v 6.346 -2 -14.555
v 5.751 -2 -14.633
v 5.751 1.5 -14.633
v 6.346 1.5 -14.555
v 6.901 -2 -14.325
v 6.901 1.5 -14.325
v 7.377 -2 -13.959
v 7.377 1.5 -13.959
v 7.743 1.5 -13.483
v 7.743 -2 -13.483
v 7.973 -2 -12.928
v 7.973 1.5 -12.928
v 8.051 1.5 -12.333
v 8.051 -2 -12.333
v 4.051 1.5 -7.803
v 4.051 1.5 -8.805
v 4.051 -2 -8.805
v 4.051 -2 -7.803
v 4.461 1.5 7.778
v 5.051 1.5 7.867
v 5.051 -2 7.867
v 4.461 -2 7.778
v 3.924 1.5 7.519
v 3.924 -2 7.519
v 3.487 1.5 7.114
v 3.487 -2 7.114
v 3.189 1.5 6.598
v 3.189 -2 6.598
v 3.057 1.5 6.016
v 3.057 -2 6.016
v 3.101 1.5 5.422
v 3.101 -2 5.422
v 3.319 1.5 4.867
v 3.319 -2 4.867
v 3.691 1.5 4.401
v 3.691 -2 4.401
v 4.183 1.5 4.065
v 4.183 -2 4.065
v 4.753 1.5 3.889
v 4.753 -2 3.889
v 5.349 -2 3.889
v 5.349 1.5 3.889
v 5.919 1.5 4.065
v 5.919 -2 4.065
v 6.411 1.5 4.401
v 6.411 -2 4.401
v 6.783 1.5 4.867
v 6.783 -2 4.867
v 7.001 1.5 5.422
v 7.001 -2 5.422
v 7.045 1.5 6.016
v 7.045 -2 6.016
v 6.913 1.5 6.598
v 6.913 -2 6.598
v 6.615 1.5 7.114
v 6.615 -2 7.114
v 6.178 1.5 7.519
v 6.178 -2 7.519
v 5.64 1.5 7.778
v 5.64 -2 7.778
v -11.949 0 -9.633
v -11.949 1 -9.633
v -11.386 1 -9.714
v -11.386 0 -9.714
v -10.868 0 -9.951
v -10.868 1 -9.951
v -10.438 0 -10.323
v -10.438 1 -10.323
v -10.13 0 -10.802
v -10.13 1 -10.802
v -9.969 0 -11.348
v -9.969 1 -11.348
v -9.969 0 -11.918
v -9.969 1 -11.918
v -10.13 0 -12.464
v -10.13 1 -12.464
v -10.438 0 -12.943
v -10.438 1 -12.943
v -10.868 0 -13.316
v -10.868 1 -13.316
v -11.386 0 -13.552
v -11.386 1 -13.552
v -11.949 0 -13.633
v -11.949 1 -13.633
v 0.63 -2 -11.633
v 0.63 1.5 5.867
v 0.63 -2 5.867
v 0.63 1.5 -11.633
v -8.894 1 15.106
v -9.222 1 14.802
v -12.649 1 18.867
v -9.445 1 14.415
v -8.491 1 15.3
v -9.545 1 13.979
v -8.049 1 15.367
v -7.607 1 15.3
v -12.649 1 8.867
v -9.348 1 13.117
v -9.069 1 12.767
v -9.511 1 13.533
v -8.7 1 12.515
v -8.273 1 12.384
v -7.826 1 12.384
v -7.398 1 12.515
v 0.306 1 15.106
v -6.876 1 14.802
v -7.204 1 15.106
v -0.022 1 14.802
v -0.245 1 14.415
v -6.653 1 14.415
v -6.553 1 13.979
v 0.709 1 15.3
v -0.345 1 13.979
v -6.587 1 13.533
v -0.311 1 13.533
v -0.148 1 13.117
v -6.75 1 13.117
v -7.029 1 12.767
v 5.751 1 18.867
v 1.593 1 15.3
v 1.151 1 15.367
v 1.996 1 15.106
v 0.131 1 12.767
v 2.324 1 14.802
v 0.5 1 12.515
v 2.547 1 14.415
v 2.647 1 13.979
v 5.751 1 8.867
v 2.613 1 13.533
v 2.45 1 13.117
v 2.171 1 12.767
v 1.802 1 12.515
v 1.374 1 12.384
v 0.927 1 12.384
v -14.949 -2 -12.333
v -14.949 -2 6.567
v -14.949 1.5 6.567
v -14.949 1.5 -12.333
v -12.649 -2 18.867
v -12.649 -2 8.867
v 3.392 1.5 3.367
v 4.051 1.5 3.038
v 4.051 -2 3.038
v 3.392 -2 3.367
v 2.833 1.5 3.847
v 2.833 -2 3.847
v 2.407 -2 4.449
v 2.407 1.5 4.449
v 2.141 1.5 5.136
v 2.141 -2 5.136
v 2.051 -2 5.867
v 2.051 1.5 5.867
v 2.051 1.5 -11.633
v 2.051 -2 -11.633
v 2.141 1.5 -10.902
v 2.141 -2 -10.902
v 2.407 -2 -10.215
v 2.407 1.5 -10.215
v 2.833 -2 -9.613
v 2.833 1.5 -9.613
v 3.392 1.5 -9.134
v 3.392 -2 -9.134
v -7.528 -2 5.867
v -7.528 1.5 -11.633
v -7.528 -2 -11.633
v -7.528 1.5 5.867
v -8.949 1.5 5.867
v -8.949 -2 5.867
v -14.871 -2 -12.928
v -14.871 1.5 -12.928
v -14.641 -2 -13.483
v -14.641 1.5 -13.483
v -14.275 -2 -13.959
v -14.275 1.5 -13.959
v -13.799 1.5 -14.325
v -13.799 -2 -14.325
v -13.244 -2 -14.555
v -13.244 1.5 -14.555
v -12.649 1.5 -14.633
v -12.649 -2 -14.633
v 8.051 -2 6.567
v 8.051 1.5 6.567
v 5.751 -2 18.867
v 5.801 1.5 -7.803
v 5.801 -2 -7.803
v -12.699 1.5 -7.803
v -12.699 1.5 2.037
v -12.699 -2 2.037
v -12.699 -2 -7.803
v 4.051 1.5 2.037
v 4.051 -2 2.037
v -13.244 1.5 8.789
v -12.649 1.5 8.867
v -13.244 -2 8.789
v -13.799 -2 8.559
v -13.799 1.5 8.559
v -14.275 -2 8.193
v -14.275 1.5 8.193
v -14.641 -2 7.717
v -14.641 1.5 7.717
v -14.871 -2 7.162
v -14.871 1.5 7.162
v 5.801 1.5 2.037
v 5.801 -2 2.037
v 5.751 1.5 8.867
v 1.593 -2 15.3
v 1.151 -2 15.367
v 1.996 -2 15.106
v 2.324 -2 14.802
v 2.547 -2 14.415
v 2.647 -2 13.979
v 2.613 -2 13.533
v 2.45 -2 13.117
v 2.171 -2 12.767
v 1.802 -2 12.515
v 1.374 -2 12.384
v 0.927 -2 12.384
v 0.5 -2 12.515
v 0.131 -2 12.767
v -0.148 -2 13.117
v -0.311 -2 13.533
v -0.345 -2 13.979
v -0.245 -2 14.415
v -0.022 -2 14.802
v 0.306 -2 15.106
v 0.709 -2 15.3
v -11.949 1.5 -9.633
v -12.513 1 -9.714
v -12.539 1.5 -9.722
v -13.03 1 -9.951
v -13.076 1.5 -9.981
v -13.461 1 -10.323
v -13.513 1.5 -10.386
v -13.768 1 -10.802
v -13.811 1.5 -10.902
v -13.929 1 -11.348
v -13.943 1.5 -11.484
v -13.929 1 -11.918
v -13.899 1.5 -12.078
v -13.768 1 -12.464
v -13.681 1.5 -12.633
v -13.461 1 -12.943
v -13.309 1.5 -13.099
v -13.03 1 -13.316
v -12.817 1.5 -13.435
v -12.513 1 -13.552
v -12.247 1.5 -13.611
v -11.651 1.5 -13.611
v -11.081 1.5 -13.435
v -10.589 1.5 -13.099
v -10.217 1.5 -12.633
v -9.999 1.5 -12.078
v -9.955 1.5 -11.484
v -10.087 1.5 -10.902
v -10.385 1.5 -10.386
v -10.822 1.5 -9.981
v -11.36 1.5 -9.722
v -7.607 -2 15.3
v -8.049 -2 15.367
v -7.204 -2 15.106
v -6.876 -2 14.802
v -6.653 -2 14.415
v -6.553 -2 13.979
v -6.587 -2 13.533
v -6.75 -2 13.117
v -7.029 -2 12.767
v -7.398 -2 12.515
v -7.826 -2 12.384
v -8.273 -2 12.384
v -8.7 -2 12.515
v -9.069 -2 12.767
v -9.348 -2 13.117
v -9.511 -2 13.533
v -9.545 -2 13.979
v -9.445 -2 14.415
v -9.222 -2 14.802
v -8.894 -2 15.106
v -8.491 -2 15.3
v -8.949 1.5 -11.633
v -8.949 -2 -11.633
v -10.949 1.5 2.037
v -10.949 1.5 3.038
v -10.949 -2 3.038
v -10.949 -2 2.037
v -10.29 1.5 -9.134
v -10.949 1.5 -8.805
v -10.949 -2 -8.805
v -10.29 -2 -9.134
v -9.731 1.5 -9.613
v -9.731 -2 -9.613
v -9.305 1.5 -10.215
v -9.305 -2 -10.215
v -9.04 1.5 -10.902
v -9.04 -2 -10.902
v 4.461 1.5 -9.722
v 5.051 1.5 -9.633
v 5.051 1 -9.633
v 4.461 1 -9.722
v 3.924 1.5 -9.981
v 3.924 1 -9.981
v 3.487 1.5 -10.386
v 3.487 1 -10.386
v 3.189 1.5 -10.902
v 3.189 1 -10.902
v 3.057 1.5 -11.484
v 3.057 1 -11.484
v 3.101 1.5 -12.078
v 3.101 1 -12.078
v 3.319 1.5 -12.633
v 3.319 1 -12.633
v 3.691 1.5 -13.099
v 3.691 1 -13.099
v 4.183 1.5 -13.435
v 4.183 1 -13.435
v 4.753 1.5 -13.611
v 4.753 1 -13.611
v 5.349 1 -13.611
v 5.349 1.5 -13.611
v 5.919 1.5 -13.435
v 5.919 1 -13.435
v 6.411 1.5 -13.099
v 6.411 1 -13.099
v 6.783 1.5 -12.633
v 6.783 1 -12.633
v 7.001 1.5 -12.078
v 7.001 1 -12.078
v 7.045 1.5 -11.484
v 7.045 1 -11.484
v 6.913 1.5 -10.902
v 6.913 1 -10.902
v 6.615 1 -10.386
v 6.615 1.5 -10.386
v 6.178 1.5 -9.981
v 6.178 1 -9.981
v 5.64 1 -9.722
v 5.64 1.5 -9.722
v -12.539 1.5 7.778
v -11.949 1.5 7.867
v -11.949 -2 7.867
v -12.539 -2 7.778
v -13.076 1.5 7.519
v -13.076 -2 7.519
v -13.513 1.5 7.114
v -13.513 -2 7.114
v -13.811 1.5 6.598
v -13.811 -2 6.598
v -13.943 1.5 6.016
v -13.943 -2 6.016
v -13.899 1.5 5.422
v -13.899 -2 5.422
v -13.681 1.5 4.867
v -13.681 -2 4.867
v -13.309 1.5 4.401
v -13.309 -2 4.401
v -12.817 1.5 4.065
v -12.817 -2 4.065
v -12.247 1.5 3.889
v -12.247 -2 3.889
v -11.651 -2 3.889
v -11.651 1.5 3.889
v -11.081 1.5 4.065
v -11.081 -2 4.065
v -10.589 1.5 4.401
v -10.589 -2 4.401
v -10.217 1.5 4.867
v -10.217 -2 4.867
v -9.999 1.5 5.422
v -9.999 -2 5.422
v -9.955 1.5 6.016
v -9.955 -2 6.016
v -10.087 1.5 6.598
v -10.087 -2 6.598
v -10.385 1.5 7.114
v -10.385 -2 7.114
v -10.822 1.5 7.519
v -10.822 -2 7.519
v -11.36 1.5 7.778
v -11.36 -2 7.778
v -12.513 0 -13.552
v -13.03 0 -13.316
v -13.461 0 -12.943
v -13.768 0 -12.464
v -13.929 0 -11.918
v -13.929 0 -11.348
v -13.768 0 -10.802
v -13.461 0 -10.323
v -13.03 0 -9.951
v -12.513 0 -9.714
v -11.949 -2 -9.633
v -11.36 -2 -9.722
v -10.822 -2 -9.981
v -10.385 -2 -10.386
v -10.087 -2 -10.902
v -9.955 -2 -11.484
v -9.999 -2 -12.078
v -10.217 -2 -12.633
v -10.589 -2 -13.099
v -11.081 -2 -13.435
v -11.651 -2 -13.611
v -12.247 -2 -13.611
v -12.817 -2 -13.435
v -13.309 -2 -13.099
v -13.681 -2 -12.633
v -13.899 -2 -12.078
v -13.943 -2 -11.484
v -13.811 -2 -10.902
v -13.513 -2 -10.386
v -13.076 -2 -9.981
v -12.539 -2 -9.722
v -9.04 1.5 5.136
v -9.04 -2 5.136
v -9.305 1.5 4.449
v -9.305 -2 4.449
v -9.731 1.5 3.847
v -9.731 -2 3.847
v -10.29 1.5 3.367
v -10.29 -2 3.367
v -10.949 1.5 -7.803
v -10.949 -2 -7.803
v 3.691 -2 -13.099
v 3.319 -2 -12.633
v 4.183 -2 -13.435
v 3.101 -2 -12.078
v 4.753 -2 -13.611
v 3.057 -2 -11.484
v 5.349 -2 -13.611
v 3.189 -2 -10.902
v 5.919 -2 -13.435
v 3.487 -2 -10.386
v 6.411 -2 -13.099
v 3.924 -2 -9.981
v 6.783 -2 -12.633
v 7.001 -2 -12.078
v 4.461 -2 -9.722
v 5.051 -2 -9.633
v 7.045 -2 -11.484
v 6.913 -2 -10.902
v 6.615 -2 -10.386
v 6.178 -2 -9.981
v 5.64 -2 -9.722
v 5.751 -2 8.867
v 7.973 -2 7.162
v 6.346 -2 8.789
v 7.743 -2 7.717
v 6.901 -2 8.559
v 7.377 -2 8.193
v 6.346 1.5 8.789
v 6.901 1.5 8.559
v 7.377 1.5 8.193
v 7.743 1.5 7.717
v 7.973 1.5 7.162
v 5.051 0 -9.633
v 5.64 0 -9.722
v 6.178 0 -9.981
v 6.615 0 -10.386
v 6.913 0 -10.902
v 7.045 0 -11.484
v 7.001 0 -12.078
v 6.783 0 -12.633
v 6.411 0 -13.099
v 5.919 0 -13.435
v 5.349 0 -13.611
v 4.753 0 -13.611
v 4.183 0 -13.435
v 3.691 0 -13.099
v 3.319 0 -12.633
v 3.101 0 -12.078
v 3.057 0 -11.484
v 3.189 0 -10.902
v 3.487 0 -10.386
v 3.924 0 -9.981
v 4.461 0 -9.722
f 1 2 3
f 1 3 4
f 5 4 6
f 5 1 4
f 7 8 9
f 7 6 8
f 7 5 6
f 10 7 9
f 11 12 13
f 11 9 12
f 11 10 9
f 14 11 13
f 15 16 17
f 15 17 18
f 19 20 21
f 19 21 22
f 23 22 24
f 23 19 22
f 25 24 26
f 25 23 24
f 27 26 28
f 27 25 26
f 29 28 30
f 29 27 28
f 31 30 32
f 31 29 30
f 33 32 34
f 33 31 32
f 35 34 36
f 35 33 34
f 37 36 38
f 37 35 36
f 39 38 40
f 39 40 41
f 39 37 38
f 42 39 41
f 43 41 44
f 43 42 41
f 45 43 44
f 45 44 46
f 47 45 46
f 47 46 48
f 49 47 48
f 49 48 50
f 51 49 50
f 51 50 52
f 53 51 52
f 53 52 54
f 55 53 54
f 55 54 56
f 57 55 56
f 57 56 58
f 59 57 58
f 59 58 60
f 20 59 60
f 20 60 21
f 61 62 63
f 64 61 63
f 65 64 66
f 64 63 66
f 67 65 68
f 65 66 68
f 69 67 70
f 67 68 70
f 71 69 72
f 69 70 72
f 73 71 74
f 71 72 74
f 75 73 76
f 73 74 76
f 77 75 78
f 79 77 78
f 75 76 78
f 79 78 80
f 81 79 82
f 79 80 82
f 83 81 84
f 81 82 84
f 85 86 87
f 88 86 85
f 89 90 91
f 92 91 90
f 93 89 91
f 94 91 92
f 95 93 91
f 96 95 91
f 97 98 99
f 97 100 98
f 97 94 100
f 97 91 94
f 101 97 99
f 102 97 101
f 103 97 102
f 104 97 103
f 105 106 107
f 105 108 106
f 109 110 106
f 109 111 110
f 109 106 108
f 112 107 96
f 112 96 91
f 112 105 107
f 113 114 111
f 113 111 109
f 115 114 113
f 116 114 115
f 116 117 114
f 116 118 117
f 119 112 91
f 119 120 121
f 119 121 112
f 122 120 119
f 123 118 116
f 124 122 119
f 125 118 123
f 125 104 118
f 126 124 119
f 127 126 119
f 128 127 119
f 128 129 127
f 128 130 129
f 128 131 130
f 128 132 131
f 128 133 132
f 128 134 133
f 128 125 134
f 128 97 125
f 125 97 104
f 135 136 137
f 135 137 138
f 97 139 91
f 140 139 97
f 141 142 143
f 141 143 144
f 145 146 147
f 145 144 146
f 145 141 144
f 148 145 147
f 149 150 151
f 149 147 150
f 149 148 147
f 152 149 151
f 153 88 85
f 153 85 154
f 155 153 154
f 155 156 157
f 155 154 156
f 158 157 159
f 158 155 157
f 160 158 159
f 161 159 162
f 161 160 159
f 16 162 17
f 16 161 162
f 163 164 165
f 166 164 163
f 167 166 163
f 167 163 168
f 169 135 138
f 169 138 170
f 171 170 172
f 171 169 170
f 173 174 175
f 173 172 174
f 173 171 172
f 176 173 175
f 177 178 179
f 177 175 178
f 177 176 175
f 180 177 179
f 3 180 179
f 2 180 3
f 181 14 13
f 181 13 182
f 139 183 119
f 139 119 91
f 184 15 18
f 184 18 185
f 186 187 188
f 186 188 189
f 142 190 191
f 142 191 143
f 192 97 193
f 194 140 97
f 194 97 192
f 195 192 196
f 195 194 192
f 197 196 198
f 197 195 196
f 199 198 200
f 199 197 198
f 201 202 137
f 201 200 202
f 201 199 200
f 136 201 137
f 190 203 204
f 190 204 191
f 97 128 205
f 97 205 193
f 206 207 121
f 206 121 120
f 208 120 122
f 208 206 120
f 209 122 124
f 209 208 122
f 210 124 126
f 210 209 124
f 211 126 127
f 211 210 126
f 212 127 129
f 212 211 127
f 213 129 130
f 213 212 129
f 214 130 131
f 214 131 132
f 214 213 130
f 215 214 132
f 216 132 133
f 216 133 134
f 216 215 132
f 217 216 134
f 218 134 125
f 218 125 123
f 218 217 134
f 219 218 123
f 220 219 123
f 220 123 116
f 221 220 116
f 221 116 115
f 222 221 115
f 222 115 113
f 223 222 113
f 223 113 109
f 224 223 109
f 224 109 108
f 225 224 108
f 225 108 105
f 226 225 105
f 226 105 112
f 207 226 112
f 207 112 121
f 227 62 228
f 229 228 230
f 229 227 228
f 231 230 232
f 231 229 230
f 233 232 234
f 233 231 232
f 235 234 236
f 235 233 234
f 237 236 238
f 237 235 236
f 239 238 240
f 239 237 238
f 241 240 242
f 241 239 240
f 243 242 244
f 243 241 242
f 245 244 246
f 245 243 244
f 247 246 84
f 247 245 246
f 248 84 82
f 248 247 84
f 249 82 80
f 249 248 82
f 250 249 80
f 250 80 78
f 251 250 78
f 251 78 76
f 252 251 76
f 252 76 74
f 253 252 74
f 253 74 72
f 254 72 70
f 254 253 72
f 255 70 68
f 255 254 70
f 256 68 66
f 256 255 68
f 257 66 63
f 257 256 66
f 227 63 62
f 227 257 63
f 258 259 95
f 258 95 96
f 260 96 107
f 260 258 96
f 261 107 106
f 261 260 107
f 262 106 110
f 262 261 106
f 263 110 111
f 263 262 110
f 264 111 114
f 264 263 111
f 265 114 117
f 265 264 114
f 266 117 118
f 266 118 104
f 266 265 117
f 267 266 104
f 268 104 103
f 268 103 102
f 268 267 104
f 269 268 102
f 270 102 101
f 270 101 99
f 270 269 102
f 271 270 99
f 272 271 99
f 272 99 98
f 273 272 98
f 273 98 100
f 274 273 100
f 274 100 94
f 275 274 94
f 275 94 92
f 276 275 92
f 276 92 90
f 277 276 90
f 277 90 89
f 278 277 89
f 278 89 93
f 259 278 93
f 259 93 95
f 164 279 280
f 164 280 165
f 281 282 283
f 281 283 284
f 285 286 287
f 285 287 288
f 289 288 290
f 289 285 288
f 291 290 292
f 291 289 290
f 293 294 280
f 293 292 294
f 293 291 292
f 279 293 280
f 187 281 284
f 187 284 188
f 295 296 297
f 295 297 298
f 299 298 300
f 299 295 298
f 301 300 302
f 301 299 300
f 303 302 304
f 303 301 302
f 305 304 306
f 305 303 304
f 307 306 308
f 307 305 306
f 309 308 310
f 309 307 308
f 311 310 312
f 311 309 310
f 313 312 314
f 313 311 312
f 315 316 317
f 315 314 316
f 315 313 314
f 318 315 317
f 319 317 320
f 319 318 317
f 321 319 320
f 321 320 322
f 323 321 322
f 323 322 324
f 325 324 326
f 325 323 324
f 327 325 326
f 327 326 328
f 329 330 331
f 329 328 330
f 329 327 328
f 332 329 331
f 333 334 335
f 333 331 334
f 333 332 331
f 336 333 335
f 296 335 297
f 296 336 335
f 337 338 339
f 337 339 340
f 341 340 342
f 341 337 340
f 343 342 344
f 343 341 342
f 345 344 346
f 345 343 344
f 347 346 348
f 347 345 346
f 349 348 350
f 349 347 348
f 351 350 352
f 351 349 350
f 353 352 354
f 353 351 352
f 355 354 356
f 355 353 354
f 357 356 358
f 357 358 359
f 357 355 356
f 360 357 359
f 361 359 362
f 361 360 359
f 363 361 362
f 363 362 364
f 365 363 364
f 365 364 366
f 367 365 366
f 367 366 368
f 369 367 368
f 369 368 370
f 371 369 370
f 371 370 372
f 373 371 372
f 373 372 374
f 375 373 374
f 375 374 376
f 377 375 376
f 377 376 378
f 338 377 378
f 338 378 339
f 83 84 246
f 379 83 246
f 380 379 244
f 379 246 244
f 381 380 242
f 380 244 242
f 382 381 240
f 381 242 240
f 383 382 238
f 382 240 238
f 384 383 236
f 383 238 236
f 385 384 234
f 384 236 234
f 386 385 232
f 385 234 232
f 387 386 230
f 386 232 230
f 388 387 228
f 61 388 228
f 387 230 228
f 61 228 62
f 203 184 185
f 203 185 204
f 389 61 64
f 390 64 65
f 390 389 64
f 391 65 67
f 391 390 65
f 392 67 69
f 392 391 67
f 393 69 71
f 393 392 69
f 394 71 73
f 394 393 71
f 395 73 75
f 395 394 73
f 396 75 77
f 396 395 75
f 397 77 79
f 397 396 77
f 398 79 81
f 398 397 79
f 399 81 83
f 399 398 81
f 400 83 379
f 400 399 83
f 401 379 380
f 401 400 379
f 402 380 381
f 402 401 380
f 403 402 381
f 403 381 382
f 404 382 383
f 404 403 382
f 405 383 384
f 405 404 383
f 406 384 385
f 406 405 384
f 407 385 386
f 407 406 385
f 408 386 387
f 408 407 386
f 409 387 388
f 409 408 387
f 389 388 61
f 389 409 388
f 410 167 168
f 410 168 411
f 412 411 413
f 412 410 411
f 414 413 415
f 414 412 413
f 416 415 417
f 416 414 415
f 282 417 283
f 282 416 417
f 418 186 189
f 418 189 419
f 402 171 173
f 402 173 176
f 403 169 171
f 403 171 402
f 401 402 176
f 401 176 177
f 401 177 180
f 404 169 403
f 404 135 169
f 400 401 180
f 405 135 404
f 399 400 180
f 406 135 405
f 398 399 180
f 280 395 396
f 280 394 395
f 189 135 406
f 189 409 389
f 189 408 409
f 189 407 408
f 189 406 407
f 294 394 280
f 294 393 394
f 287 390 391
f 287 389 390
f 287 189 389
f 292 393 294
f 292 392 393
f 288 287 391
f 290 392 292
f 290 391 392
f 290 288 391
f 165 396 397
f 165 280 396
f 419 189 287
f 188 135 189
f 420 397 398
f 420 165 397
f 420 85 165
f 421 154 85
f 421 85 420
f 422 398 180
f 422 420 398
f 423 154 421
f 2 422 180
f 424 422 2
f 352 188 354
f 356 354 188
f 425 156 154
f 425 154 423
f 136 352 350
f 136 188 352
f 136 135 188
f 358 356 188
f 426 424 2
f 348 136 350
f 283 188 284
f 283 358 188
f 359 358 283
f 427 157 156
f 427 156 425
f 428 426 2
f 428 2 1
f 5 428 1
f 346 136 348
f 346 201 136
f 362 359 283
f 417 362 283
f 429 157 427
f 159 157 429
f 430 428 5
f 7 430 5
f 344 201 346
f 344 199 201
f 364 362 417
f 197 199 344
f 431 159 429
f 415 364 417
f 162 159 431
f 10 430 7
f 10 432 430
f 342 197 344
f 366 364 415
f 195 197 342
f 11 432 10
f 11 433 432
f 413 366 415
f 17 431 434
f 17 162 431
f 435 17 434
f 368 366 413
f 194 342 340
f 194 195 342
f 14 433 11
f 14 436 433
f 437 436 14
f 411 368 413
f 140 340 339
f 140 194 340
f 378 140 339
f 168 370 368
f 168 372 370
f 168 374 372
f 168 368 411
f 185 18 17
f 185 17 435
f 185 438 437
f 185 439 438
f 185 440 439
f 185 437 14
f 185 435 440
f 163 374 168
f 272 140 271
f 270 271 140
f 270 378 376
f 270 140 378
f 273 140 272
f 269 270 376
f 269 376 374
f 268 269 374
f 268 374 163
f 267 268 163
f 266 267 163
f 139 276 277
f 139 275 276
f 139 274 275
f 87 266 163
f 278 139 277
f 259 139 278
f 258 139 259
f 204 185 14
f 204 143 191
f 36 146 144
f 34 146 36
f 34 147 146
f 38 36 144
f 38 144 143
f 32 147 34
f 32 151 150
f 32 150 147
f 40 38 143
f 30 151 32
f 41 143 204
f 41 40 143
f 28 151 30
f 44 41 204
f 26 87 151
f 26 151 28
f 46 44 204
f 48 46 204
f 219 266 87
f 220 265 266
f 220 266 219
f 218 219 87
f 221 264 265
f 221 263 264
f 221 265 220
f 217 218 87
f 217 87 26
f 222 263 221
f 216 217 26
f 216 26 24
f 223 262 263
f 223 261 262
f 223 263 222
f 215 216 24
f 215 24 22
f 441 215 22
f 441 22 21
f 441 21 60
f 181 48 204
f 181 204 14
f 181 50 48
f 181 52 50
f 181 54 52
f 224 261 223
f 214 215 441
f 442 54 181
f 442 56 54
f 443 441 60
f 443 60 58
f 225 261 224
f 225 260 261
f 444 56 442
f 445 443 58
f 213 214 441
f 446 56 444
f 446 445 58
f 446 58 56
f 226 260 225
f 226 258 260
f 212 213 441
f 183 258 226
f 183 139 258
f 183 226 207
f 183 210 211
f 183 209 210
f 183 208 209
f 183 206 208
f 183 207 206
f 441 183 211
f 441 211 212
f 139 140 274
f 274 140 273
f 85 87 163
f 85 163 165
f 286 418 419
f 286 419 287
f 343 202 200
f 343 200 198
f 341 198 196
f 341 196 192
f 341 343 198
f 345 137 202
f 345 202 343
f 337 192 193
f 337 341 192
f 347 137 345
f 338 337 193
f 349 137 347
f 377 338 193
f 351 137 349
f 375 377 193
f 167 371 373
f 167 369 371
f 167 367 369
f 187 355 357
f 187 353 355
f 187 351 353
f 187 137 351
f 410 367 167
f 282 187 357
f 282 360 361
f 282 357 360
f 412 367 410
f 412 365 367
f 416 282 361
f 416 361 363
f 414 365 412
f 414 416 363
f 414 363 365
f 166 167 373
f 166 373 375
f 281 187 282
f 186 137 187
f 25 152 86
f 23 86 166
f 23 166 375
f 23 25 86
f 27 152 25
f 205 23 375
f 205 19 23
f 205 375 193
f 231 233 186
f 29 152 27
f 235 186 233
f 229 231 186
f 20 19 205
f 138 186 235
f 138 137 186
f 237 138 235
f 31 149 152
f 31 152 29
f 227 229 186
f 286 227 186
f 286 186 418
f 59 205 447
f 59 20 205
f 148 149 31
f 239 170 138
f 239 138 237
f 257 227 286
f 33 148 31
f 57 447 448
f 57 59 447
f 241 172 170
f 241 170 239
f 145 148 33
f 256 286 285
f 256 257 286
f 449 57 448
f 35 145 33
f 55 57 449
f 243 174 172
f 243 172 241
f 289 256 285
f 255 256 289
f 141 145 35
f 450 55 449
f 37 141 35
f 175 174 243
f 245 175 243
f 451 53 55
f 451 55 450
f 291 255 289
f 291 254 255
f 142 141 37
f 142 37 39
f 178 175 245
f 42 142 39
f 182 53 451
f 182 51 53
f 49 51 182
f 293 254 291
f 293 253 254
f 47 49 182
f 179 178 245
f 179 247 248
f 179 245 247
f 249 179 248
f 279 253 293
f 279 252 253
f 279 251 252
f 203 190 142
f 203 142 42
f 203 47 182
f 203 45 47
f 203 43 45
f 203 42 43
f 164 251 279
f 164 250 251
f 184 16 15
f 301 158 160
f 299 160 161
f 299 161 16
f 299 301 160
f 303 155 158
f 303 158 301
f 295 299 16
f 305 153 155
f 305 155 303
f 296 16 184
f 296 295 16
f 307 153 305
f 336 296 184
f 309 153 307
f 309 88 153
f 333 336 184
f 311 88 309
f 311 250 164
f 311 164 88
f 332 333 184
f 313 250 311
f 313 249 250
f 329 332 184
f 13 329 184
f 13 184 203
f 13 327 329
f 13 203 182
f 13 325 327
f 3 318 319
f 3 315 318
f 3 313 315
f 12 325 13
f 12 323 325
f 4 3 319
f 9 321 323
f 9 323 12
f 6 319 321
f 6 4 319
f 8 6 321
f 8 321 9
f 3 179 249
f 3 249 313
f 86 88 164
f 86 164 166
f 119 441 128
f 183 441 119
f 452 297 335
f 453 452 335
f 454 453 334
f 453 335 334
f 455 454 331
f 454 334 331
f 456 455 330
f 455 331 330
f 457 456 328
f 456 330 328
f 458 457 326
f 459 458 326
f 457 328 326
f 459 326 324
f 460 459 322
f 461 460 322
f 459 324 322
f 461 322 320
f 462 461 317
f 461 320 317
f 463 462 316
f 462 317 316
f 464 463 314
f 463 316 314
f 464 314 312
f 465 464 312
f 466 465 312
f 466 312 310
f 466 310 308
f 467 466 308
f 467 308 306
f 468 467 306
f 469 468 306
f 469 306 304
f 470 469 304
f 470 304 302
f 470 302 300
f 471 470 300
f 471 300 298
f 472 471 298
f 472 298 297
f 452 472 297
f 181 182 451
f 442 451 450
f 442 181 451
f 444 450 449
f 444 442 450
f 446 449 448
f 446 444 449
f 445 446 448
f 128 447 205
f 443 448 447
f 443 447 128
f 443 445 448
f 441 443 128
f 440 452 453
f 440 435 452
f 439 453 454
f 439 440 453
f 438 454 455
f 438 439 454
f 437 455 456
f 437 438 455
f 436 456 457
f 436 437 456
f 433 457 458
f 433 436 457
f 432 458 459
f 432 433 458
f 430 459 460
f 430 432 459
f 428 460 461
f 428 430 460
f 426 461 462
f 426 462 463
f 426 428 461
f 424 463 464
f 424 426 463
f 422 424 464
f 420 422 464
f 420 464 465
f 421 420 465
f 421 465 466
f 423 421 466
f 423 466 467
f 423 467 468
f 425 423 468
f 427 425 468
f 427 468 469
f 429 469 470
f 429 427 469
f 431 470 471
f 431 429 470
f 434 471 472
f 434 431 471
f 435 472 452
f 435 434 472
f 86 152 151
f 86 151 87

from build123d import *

# Parameters (mm, degrees)
BOSS_EXTRUDE1_DEPTH      = 2
CUT_EXTRUDE2_DEPTH       = 1
SKETCH5_R                = 2
CUT_EXTRUDE3_DEPTH       = 21.942838525
CUT_EXTRUDE4_DEPTH       = 21.942838525
SKETCH7_W                = 18.4
SKETCH7_H                = 1
BOSS_EXTRUDE2_DEPTH      = 10
SKETCH8_R                = 1.5
CUT_EXTRUDE5_DEPTH       = 25.092211634
CUT_EXTRUDE6_DEPTH       = 1
SKETCH11_W               = 1.421057218
SKETCH11_H               = 17.5
SKETCH11_W_2             = 1.75
SKETCH11_H_2             = 9.84
CUT_EXTRUDE7_DEPTH       = 25.092211634
BOSS_EXTRUDE3_START      = 2
BOSS_EXTRUDE3_DEPTH      = 2
CUT_EXTRUDE8_DEPTH       = 25.154392176
CUT_EXTRUDE8_DEPTH_BACK  = 25.154392176
CUT_EXTRUDE9_DEPTH       = 25.154392176
CUT_EXTRUDE9_DEPTH_BACK  = 25.154392176
CUT_EXTRUDE10_DEPTH      = 25.154392176
CUT_EXTRUDE10_DEPTH_BACK = 25.154392176
SKETCH15_R               = 1.5
CUT_EXTRUDE11_DEPTH      = 25.154392176
CUT_EXTRUDE11_DEPTH_BACK = 25.154392176
SKETCH16_R               = 1.5
CUT_EXTRUDE12_DEPTH      = 25.154392176
CUT_EXTRUDE12_DEPTH_BACK = 25.154392176
SKETCH17_R               = 2
BOSS_EXTRUDE4_START      = 1
BOSS_EXTRUDE4_DEPTH      = 1
CUT_EXTRUDE13_DEPTH      = 25.257672217
CUT_EXTRUDE13_DEPTH_BACK = 25.257672217
SKETCH19_R               = 2
CUT_EXTRUDE14_START      = -0.5
CUT_EXTRUDE14_DEPTH      = 0.5


with BuildPart() as part:
    # Sketch1 → Boss-Extrude1 (new body)
    with BuildSketch(Plane(origin=(0, 0, 0), x_dir=(1, 0, 0), z_dir=(0, 1, 0))):
        with BuildLine():
            Line((-12.649074074, 14.633101852), (5.750925926, 14.633101852))
            ThreePointArc((5.750925926, 14.633101852), (7.377271523, 13.959447449), (8.050925926, 12.333101852))
            Line((8.050925926, 12.333101852), (8.050925926, -6.566898148))
            ThreePointArc((8.050925926, -6.566898148), (7.377271523, -8.193243745), (5.750925926, -8.866898148))
            Line((5.750925926, -8.866898148), (-12.649074074, -8.866898148))
            ThreePointArc((-12.649074074, -8.866898148), (-14.275419671, -8.193243745), (-14.949074074, -6.566898148))
            Line((-14.949074074, -6.566898148), (-14.949074074, 12.333101852))
            ThreePointArc((-14.949074074, 12.333101852), (-14.275419671, 13.959447449), (-12.649074074, 14.633101852))
        make_face()
    extrude(amount=BOSS_EXTRUDE1_DEPTH)

    # Sketch2 → Cut-Extrude2 (cut)
    with BuildSketch(Plane(origin=(0, 2, 0), x_dir=(1, 0, 0), z_dir=(0, 1, 0))):
        with BuildLine():
            Line((5.750925926, 13.633101852), (-12.649074074, 13.633101852))
            ThreePointArc((-12.649074074, 13.633101852), (-13.56831289, 13.252340667), (-13.949074074, 12.333101852))
            Line((-13.949074074, 12.333101852), (-13.949074074, -6.566898148))
            ThreePointArc((-13.949074074, -6.566898148), (-13.56831289, -7.486136964), (-12.649074074, -7.866898148))
            Line((-12.649074074, -7.866898148), (5.750925926, -7.866898148))
            ThreePointArc((5.750925926, -7.866898148), (6.670164741, -7.486136964), (7.050925926, -6.566898148))
            Line((7.050925926, -6.566898148), (7.050925926, 12.333101852))
            ThreePointArc((7.050925926, 12.333101852), (6.670164741, 13.252340667), (5.750925926, 13.633101852))
        make_face()
    extrude(amount=-CUT_EXTRUDE2_DEPTH, mode=Mode.SUBTRACT)

    # Sketch5 → Cut-Extrude3 (cut, through all)
    with BuildSketch(Plane(origin=(0, 1, 0), x_dir=(1, 0, 0), z_dir=(0, 1, 0))):
        with Locations(Location((5.050925926, 11.633101852, 0), (0, 0, 270))):
            Circle(SKETCH5_R)
        with Locations(Location((5.050925926, -5.866898148, 0), (0, 0, 270))):
            Circle(SKETCH5_R)
        with Locations(Location((-11.949074074, -5.866898148, 0), (0, 0, 270))):
            Circle(SKETCH5_R)
        with Locations(Location((-11.949074074, 11.633101852, 0), (0, 0, 90))):
            Circle(SKETCH5_R)
    extrude(amount=-CUT_EXTRUDE3_DEPTH, mode=Mode.SUBTRACT)

    # Sketch6 → Cut-Extrude4 (cut, through all)
    with BuildSketch(Plane(origin=(0, 1, 0), x_dir=(1, 0, 0), z_dir=(0, 1, 0))):
        with BuildLine():
            Line((4.050925926, -3.038471023), (4.050925926, 8.804674727))
            ThreePointArc((4.050925926, 8.804674727), (2.601436183, 9.901051044), (2.050925926, 11.633101852))
            Line((2.050925926, 11.633101852), (2.050925926, -5.866898148))
            ThreePointArc((2.050925926, -5.866898148), (2.601436183, -4.134847341), (4.050925926, -3.038471023))
        make_face()
        with BuildLine():
            Line((-10.949074074, 8.804674727), (-10.949074074, -3.038471023))
            ThreePointArc((-10.949074074, -3.038471023), (-9.499584331, -4.134847341), (-8.949074074, -5.866898148))
            Line((-8.949074074, -5.866898148), (-8.949074074, 11.633101852))
            ThreePointArc((-8.949074074, 11.633101852), (-9.499584331, 9.901051044), (-10.949074074, 8.804674727))
        make_face()
    extrude(amount=-CUT_EXTRUDE4_DEPTH, mode=Mode.SUBTRACT)

    # Sketch7 → Boss-Extrude2 (add)
    with BuildSketch(Plane.XY.offset(8.866898148)):
        with Locations((-3.449074074, 0.5)):
            Rectangle(SKETCH7_W, SKETCH7_H)
    extrude(amount=BOSS_EXTRUDE2_DEPTH)

    # Sketch8 → Cut-Extrude5 (cut, through all)
    with BuildSketch(Plane(origin=(0, 1, 0), x_dir=(1, 0, 0), z_dir=(0, 1, 0))):
        with Locations(Location((1.150925926, -13.866898148, 0), (0, 0, 270))):
            Circle(SKETCH8_R)
        with Locations(Location((-8.049074074, -13.866898148, 0), (0, 0, 270))):
            Circle(SKETCH8_R)
    extrude(amount=-CUT_EXTRUDE5_DEPTH, mode=Mode.SUBTRACT)

    # Sketch9 → Cut-Extrude6 (cut)
    with BuildSketch(Plane(origin=(0, 2, 0), x_dir=(1, 0, 0), z_dir=(0, 1, 0))):
        with BuildLine():
            Line((5.750925926, 13.833101852), (-12.649074074, 13.833101852))
            ThreePointArc((-12.649074074, 13.833101852), (-13.709734246, 13.393762024), (-14.149074074, 12.333101852))
            Line((-14.149074074, 12.333101852), (-14.149074074, -6.566898148))
            ThreePointArc((-14.149074074, -6.566898148), (-13.709734246, -7.62755832), (-12.649074074, -8.066898148))
            Line((-12.649074074, -8.066898148), (5.750925926, -8.066898148))
            ThreePointArc((5.750925926, -8.066898148), (6.811586098, -7.62755832), (7.250925926, -6.566898148))
            Line((7.250925926, -6.566898148), (7.250925926, 12.333101852))
            ThreePointArc((7.250925926, 12.333101852), (6.811586098, 13.393762024), (5.750925926, 13.833101852))
        make_face()
    extrude(amount=-CUT_EXTRUDE6_DEPTH, mode=Mode.SUBTRACT)

    # Sketch11 → Cut-Extrude7 (cut, through all)
    with BuildSketch(Plane(origin=(0, 1, 0), x_dir=(1, 0, 0), z_dir=(0, 1, 0))):
        with Locations((-8.238545465, 2.883101852)):
            Rectangle(SKETCH11_W, SKETCH11_H)
        with Locations((1.340397317, 2.883101852)):
            Rectangle(SKETCH11_W, SKETCH11_H)
        with Locations((-11.824074074, 2.883101852)):
            Rectangle(SKETCH11_W_2, SKETCH11_H_2)
        with Locations((4.925925926, 2.883101852)):
            Rectangle(SKETCH11_W_2, SKETCH11_H_2)
    extrude(amount=-CUT_EXTRUDE7_DEPTH, mode=Mode.SUBTRACT)

    # Sketch12 → Boss-Extrude3 (add)
    with BuildSketch(Plane.XZ.offset(BOSS_EXTRUDE3_START)):
        with BuildLine():
            Line((8.050925926, -12.333101852), (8.050925926, 6.566898148))
            ThreePointArc((8.050925926, 6.566898148), (7.377271523, 8.193243745), (5.750925926, 8.866898148))
            Line((5.750925926, 8.866898148), (5.750925926, 18.866898148))
            Line((5.750925926, 18.866898148), (-12.649074074, 18.866898148))
            Line((-12.649074074, 18.866898148), (-12.649074074, 8.866898148))
            ThreePointArc((-12.649074074, 8.866898148), (-14.275419671, 8.193243745), (-14.949074074, 6.566898148))
            Line((-14.949074074, 6.566898148), (-14.949074074, -12.333101852))
            ThreePointArc((-14.949074074, -12.333101852), (-14.275419671, -13.959447449), (-12.649074074, -14.633101852))
            Line((-12.649074074, -14.633101852), (5.750925926, -14.633101852))
            ThreePointArc((5.750925926, -14.633101852), (7.377271523, -13.959447449), (8.050925926, -12.333101852))
        make_face()
    extrude(amount=-BOSS_EXTRUDE3_DEPTH)

    # Sketch13 → Cut-Extrude8 (cut, two sides: drawn at the far end of the back side and taken through both)
    with BuildSketch(Plane(origin=(0, 0, 0), x_dir=(1, 0, 0), z_dir=(0, 1, 0)).offset(-CUT_EXTRUDE8_DEPTH_BACK)):
        with BuildLine():
            Line((-12.699074074, 7.803101852), (-12.699074074, -2.036898148))
            Line((-12.699074074, -2.036898148), (-10.949074074, -2.036898148))
            Line((-10.949074074, -2.036898148), (-10.949074074, -3.038471023))
            ThreePointArc((-10.949074074, -3.038471023), (-9.499584331, -4.134847341), (-8.949074074, -5.866898148))
            Line((-8.949074074, -5.866898148), (-7.528016856, -5.866898148))
            Line((-7.528016856, -5.866898148), (-7.528016856, 11.633101852))
            Line((-7.528016856, 11.633101852), (-8.949074074, 11.633101852))
            ThreePointArc((-8.949074074, 11.633101852), (-9.499584331, 9.901051044), (-10.949074074, 8.804674727))
            Line((-10.949074074, 8.804674727), (-10.949074074, 7.803101852))
            Line((-10.949074074, 7.803101852), (-12.699074074, 7.803101852))
        make_face()
    extrude(amount=CUT_EXTRUDE8_DEPTH + CUT_EXTRUDE8_DEPTH_BACK, mode=Mode.SUBTRACT)

    # Sketch14 → Cut-Extrude9 (cut, two sides: drawn at the far end of the back side and taken through both)
    with BuildSketch(Plane(origin=(0, 0, 0), x_dir=(1, 0, 0), z_dir=(0, 1, 0)).offset(-CUT_EXTRUDE9_DEPTH_BACK)):
        with BuildLine():
            Line((0.629868708, -5.866898148), (2.050925926, -5.866898148))
            ThreePointArc((2.050925926, -5.866898148), (2.601436183, -4.134847341), (4.050925926, -3.038471023))
            Line((4.050925926, -3.038471023), (4.050925926, -2.036898148))
            Line((4.050925926, -2.036898148), (5.800925926, -2.036898148))
            Line((5.800925926, -2.036898148), (5.800925926, 7.803101852))
            Line((5.800925926, 7.803101852), (4.050925926, 7.803101852))
            Line((4.050925926, 7.803101852), (4.050925926, 8.804674727))
            ThreePointArc((4.050925926, 8.804674727), (2.601436183, 9.901051044), (2.050925926, 11.633101852))
            Line((2.050925926, 11.633101852), (0.629868708, 11.633101852))
            Line((0.629868708, 11.633101852), (0.629868708, -5.866898148))
        make_face()
    extrude(amount=CUT_EXTRUDE9_DEPTH + CUT_EXTRUDE9_DEPTH_BACK, mode=Mode.SUBTRACT)

    # Sketch15 → Cut-Extrude10 (cut, two sides: drawn at the far end of the back side and taken through both)
    with BuildSketch(Plane(origin=(0, 0, 0), x_dir=(1, 0, 0), z_dir=(0, 1, 0)).offset(-CUT_EXTRUDE10_DEPTH_BACK)):
        with Locations(Location((-8.049074074, -13.866898148, 0), (0, 0, 270))):
            Circle(SKETCH15_R)
    extrude(amount=CUT_EXTRUDE10_DEPTH + CUT_EXTRUDE10_DEPTH_BACK, mode=Mode.SUBTRACT)

    # Sketch16 → Cut-Extrude11 (cut, two sides: drawn at the far end of the back side and taken through both)
    with BuildSketch(Plane(origin=(0, 0, 0), x_dir=(1, 0, 0), z_dir=(0, 1, 0)).offset(-CUT_EXTRUDE11_DEPTH_BACK)):
        with Locations(Location((1.150925926, -13.866898148, 0), (0, 0, 270))):
            Circle(SKETCH16_R)
    extrude(amount=CUT_EXTRUDE11_DEPTH + CUT_EXTRUDE11_DEPTH_BACK, mode=Mode.SUBTRACT)

    # Sketch17 → Cut-Extrude12 (cut, two sides: drawn at the far end of the back side and taken through both)
    with BuildSketch(Plane(origin=(0, 0, 0), x_dir=(1, 0, 0), z_dir=(0, 1, 0)).offset(-CUT_EXTRUDE12_DEPTH_BACK)):
        with Locations(Location((-11.949074074, -5.866898148, 0), (0, 0, 270))):
            Circle(SKETCH17_R)
        with Locations(Location((5.050925926, -5.866898148, 0), (0, 0, 270))):
            Circle(SKETCH17_R)
        with Locations(Location((-11.949074074, 11.633101852, 0), (0, 0, 270))):
            Circle(SKETCH17_R)
        with Locations(Location((5.050925926, 11.633101852, 0), (0, 0, 270))):
            Circle(SKETCH17_R)
    extrude(amount=CUT_EXTRUDE12_DEPTH + CUT_EXTRUDE12_DEPTH_BACK, mode=Mode.SUBTRACT)

    # Sketch18 → Boss-Extrude4 (add)
    with BuildSketch(Plane(origin=(0, 1, 0), x_dir=(1, 0, 0), z_dir=(0, 1, 0)).offset(BOSS_EXTRUDE4_START)):
        with BuildLine():
            Line((5.750925926, 13.833101852), (-12.649074074, 13.833101852))
            ThreePointArc((-12.649074074, 13.833101852), (-13.709734246, 13.393762024), (-14.149074074, 12.333101852))
            Line((-14.149074074, 12.333101852), (-14.149074074, -6.566898148))
            ThreePointArc((-14.149074074, -6.566898148), (-13.709734246, -7.62755832), (-12.649074074, -8.066898148))
            Line((-12.649074074, -8.066898148), (5.750925926, -8.066898148))
            ThreePointArc((5.750925926, -8.066898148), (6.811586098, -7.62755832), (7.250925926, -6.566898148))
            Line((7.250925926, -6.566898148), (7.250925926, 12.333101852))
            ThreePointArc((7.250925926, 12.333101852), (6.811586098, 13.393762024), (5.750925926, 13.833101852))
        make_face()
    extrude(amount=-BOSS_EXTRUDE4_DEPTH)

    # Sketch19 → Cut-Extrude13 (cut, two sides: drawn at the far end of the back side and taken through both)
    with BuildSketch(Plane.XZ.offset(-1).offset(-CUT_EXTRUDE13_DEPTH_BACK)):
        with Locations(Location((5.050925926, -11.633101852, 0), (0, 0, 90))):
            Circle(SKETCH19_R)
        with Locations(Location((-11.949074074, -11.633101852, 0), (0, 0, 90))):
            Circle(SKETCH19_R)
        with Locations(Location((-11.949074074, 5.866898148, 0), (0, 0, 90))):
            Circle(SKETCH19_R)
        with Locations(Location((5.050925926, 5.866898148, 0), (0, 0, 90))):
            Circle(SKETCH19_R)
        with BuildLine():
            Line((-10.949074074, 3.038471023), (-10.949074074, 2.036898148))
            Line((-10.949074074, 2.036898148), (-12.699074074, 2.036898148))
            Line((-12.699074074, 2.036898148), (-12.699074074, -7.803101852))
            Line((-12.699074074, -7.803101852), (-10.949074074, -7.803101852))
            Line((-10.949074074, -7.803101852), (-10.949074074, -8.804674727))
            ThreePointArc((-10.949074074, -8.804674727), (-9.499584331, -9.901051044), (-8.949074074, -11.633101852))
            Line((-8.949074074, -11.633101852), (-7.528016856, -11.633101852))
            Line((-7.528016856, -11.633101852), (-7.528016856, 5.866898148))
            Line((-7.528016856, 5.866898148), (-8.949074074, 5.866898148))
            ThreePointArc((-8.949074074, 5.866898148), (-9.499584331, 4.134847341), (-10.949074074, 3.038471023))
        make_face()
        with BuildLine():
            Line((4.050925926, 2.036898148), (4.050925926, 3.038471023))
            ThreePointArc((4.050925926, 3.038471023), (2.601436183, 4.134847341), (2.050925926, 5.866898148))
            Line((2.050925926, 5.866898148), (0.629868708, 5.866898148))
            Line((0.629868708, 5.866898148), (0.629868708, -11.633101852))
            Line((0.629868708, -11.633101852), (2.050925926, -11.633101852))
            ThreePointArc((2.050925926, -11.633101852), (2.601436183, -9.901051044), (4.050925926, -8.804674727))
            Line((4.050925926, -8.804674727), (4.050925926, -7.803101852))
            Line((4.050925926, -7.803101852), (5.800925926, -7.803101852))
            Line((5.800925926, -7.803101852), (5.800925926, 2.036898148))
            Line((5.800925926, 2.036898148), (4.050925926, 2.036898148))
        make_face()
    extrude(amount=CUT_EXTRUDE13_DEPTH + CUT_EXTRUDE13_DEPTH_BACK, mode=Mode.SUBTRACT)

    # Sketch20 → Cut-Extrude14 (cut)
    with BuildSketch(Plane(origin=(0, 2, 0), x_dir=(1, 0, 0), z_dir=(0, 1, 0)).offset(CUT_EXTRUDE14_START)):
        with BuildLine():
            Line((5.750925926, 14.633101852), (-12.649074074, 14.633101852))
            ThreePointArc((-12.649074074, 14.633101852), (-14.275419671, 13.959447449), (-14.949074074, 12.333101852))
            Line((-14.949074074, 12.333101852), (-14.949074074, -6.566898148))
            ThreePointArc((-14.949074074, -6.566898148), (-14.275419671, -8.193243745), (-12.649074074, -8.866898148))
            Line((-12.649074074, -8.866898148), (5.750925926, -8.866898148))
            ThreePointArc((5.750925926, -8.866898148), (7.377271523, -8.193243745), (8.050925926, -6.566898148))
            Line((8.050925926, -6.566898148), (8.050925926, 12.333101852))
            ThreePointArc((8.050925926, 12.333101852), (7.377271523, 13.959447449), (5.750925926, 14.633101852))
        make_face()
    extrude(amount=CUT_EXTRUDE14_DEPTH, mode=Mode.SUBTRACT)


solid = part.part
